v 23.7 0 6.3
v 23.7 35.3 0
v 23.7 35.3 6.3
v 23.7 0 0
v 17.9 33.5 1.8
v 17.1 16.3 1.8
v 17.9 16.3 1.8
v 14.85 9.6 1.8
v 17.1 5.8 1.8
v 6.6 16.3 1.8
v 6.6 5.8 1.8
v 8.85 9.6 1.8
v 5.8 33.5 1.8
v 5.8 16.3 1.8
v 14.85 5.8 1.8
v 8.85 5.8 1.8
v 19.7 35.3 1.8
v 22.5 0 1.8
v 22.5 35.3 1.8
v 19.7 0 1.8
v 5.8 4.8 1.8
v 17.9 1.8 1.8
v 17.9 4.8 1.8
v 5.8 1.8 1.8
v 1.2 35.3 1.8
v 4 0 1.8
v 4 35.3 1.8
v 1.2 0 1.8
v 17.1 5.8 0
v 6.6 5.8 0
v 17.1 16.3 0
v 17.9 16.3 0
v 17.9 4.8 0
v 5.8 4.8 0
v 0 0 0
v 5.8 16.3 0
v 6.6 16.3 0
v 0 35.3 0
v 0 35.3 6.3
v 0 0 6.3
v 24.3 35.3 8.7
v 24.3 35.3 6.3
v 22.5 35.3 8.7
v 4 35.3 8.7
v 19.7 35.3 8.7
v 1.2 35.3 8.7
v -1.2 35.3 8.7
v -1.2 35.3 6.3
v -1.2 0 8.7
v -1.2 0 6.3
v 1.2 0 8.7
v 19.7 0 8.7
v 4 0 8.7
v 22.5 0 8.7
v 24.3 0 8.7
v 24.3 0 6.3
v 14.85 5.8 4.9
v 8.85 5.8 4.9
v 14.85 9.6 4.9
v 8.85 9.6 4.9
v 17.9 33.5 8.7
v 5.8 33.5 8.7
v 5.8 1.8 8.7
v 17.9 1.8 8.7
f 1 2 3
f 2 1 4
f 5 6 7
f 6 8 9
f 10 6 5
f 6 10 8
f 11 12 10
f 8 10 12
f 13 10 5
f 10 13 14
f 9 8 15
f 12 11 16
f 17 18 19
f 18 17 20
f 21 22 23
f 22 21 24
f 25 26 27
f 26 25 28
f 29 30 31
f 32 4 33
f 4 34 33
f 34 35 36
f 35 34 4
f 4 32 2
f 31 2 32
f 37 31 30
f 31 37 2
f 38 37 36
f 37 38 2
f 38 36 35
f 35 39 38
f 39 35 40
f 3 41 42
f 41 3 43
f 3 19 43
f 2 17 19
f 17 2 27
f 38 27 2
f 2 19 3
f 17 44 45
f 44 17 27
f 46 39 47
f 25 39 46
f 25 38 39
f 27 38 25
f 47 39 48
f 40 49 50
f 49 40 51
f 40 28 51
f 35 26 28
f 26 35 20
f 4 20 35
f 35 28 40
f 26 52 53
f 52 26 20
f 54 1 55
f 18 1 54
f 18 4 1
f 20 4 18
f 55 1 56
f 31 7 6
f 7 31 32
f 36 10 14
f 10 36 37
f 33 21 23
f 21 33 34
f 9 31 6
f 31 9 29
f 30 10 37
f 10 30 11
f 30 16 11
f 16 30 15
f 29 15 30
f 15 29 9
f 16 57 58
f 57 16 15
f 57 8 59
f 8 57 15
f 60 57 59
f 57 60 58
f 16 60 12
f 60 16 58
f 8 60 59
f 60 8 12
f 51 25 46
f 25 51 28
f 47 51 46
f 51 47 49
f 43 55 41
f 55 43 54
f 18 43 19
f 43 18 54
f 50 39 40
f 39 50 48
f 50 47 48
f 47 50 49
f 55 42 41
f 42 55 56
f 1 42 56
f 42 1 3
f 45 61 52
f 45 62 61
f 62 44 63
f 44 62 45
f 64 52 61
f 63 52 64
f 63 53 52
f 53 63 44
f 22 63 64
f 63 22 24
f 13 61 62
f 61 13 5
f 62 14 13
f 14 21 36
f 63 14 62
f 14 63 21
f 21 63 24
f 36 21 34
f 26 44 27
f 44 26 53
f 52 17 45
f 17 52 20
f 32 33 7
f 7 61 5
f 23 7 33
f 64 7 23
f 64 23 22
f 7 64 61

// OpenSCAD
base_length = 23.7;
base_width = 35.3;
base_height = 1.8;

button_length = 10.5;
button_width = 10.5;
button_pin_length = 6;
button_pin_width = 3.8;
button_pin_height = 4.9;

raiser_height = 8.7;
raiser_length = 1.2;

bump_height = 2.4;
bump_width = base_width;
bump_length = 1.8;

back_length = 15;

// base
difference()
{
	color("blue")
		cube(size=[base_length, base_width, base_height], center=false);

	// button cut out
	translate([(base_length-button_length-2)/2,4.8,-2])
		cube(size=[button_length+2, button_width+1, base_height+4], center=false);
}

// button
translate([(base_length-button_length)/2,5.8,0])
{
	color("pink")
	{
		cube(size=[button_length, button_width, base_height], center=false);

		translate([(button_length-button_pin_length)/2,0,0])
			cube(size=[button_pin_length, button_pin_width, button_pin_height], center=false);
	}
}

// raiser
cube(size=[raiser_length,base_width,raiser_height], center=false);
translate([base_length-raiser_length,0,0])
	cube(size=[raiser_length,base_width,raiser_height], center=false);


// bump
translate([-raiser_length,0,6.3])
	cube(size=[bump_length,bump_width,bump_height], center=false);

translate([-raiser_length+base_length,0,6.3])
	cube(size=[bump_length,bump_width,bump_height], center=false);
//translate([base_length-raiser_length,0,0])
//	cube(size=[raiser_length,base_width,raiser_height], center=false);


// back
translate([(base_length-back_length)/2,0,0])
	cube(size=[back_length,bump_length,8.7], center=false);

// front
translate([(base_length-back_length)/2,base_width-bump_length,0])
	cube(size=[back_length,bump_length,8.7], center=false);

// rails
color("pink")
translate([4,0,0])
	cube(size=[bump_length,bump_width,8.7], center=false);

color("blue")
translate([base_length-4-bump_length,0,0])
	cube(size=[bump_length,bump_width,8.7], center=false);
